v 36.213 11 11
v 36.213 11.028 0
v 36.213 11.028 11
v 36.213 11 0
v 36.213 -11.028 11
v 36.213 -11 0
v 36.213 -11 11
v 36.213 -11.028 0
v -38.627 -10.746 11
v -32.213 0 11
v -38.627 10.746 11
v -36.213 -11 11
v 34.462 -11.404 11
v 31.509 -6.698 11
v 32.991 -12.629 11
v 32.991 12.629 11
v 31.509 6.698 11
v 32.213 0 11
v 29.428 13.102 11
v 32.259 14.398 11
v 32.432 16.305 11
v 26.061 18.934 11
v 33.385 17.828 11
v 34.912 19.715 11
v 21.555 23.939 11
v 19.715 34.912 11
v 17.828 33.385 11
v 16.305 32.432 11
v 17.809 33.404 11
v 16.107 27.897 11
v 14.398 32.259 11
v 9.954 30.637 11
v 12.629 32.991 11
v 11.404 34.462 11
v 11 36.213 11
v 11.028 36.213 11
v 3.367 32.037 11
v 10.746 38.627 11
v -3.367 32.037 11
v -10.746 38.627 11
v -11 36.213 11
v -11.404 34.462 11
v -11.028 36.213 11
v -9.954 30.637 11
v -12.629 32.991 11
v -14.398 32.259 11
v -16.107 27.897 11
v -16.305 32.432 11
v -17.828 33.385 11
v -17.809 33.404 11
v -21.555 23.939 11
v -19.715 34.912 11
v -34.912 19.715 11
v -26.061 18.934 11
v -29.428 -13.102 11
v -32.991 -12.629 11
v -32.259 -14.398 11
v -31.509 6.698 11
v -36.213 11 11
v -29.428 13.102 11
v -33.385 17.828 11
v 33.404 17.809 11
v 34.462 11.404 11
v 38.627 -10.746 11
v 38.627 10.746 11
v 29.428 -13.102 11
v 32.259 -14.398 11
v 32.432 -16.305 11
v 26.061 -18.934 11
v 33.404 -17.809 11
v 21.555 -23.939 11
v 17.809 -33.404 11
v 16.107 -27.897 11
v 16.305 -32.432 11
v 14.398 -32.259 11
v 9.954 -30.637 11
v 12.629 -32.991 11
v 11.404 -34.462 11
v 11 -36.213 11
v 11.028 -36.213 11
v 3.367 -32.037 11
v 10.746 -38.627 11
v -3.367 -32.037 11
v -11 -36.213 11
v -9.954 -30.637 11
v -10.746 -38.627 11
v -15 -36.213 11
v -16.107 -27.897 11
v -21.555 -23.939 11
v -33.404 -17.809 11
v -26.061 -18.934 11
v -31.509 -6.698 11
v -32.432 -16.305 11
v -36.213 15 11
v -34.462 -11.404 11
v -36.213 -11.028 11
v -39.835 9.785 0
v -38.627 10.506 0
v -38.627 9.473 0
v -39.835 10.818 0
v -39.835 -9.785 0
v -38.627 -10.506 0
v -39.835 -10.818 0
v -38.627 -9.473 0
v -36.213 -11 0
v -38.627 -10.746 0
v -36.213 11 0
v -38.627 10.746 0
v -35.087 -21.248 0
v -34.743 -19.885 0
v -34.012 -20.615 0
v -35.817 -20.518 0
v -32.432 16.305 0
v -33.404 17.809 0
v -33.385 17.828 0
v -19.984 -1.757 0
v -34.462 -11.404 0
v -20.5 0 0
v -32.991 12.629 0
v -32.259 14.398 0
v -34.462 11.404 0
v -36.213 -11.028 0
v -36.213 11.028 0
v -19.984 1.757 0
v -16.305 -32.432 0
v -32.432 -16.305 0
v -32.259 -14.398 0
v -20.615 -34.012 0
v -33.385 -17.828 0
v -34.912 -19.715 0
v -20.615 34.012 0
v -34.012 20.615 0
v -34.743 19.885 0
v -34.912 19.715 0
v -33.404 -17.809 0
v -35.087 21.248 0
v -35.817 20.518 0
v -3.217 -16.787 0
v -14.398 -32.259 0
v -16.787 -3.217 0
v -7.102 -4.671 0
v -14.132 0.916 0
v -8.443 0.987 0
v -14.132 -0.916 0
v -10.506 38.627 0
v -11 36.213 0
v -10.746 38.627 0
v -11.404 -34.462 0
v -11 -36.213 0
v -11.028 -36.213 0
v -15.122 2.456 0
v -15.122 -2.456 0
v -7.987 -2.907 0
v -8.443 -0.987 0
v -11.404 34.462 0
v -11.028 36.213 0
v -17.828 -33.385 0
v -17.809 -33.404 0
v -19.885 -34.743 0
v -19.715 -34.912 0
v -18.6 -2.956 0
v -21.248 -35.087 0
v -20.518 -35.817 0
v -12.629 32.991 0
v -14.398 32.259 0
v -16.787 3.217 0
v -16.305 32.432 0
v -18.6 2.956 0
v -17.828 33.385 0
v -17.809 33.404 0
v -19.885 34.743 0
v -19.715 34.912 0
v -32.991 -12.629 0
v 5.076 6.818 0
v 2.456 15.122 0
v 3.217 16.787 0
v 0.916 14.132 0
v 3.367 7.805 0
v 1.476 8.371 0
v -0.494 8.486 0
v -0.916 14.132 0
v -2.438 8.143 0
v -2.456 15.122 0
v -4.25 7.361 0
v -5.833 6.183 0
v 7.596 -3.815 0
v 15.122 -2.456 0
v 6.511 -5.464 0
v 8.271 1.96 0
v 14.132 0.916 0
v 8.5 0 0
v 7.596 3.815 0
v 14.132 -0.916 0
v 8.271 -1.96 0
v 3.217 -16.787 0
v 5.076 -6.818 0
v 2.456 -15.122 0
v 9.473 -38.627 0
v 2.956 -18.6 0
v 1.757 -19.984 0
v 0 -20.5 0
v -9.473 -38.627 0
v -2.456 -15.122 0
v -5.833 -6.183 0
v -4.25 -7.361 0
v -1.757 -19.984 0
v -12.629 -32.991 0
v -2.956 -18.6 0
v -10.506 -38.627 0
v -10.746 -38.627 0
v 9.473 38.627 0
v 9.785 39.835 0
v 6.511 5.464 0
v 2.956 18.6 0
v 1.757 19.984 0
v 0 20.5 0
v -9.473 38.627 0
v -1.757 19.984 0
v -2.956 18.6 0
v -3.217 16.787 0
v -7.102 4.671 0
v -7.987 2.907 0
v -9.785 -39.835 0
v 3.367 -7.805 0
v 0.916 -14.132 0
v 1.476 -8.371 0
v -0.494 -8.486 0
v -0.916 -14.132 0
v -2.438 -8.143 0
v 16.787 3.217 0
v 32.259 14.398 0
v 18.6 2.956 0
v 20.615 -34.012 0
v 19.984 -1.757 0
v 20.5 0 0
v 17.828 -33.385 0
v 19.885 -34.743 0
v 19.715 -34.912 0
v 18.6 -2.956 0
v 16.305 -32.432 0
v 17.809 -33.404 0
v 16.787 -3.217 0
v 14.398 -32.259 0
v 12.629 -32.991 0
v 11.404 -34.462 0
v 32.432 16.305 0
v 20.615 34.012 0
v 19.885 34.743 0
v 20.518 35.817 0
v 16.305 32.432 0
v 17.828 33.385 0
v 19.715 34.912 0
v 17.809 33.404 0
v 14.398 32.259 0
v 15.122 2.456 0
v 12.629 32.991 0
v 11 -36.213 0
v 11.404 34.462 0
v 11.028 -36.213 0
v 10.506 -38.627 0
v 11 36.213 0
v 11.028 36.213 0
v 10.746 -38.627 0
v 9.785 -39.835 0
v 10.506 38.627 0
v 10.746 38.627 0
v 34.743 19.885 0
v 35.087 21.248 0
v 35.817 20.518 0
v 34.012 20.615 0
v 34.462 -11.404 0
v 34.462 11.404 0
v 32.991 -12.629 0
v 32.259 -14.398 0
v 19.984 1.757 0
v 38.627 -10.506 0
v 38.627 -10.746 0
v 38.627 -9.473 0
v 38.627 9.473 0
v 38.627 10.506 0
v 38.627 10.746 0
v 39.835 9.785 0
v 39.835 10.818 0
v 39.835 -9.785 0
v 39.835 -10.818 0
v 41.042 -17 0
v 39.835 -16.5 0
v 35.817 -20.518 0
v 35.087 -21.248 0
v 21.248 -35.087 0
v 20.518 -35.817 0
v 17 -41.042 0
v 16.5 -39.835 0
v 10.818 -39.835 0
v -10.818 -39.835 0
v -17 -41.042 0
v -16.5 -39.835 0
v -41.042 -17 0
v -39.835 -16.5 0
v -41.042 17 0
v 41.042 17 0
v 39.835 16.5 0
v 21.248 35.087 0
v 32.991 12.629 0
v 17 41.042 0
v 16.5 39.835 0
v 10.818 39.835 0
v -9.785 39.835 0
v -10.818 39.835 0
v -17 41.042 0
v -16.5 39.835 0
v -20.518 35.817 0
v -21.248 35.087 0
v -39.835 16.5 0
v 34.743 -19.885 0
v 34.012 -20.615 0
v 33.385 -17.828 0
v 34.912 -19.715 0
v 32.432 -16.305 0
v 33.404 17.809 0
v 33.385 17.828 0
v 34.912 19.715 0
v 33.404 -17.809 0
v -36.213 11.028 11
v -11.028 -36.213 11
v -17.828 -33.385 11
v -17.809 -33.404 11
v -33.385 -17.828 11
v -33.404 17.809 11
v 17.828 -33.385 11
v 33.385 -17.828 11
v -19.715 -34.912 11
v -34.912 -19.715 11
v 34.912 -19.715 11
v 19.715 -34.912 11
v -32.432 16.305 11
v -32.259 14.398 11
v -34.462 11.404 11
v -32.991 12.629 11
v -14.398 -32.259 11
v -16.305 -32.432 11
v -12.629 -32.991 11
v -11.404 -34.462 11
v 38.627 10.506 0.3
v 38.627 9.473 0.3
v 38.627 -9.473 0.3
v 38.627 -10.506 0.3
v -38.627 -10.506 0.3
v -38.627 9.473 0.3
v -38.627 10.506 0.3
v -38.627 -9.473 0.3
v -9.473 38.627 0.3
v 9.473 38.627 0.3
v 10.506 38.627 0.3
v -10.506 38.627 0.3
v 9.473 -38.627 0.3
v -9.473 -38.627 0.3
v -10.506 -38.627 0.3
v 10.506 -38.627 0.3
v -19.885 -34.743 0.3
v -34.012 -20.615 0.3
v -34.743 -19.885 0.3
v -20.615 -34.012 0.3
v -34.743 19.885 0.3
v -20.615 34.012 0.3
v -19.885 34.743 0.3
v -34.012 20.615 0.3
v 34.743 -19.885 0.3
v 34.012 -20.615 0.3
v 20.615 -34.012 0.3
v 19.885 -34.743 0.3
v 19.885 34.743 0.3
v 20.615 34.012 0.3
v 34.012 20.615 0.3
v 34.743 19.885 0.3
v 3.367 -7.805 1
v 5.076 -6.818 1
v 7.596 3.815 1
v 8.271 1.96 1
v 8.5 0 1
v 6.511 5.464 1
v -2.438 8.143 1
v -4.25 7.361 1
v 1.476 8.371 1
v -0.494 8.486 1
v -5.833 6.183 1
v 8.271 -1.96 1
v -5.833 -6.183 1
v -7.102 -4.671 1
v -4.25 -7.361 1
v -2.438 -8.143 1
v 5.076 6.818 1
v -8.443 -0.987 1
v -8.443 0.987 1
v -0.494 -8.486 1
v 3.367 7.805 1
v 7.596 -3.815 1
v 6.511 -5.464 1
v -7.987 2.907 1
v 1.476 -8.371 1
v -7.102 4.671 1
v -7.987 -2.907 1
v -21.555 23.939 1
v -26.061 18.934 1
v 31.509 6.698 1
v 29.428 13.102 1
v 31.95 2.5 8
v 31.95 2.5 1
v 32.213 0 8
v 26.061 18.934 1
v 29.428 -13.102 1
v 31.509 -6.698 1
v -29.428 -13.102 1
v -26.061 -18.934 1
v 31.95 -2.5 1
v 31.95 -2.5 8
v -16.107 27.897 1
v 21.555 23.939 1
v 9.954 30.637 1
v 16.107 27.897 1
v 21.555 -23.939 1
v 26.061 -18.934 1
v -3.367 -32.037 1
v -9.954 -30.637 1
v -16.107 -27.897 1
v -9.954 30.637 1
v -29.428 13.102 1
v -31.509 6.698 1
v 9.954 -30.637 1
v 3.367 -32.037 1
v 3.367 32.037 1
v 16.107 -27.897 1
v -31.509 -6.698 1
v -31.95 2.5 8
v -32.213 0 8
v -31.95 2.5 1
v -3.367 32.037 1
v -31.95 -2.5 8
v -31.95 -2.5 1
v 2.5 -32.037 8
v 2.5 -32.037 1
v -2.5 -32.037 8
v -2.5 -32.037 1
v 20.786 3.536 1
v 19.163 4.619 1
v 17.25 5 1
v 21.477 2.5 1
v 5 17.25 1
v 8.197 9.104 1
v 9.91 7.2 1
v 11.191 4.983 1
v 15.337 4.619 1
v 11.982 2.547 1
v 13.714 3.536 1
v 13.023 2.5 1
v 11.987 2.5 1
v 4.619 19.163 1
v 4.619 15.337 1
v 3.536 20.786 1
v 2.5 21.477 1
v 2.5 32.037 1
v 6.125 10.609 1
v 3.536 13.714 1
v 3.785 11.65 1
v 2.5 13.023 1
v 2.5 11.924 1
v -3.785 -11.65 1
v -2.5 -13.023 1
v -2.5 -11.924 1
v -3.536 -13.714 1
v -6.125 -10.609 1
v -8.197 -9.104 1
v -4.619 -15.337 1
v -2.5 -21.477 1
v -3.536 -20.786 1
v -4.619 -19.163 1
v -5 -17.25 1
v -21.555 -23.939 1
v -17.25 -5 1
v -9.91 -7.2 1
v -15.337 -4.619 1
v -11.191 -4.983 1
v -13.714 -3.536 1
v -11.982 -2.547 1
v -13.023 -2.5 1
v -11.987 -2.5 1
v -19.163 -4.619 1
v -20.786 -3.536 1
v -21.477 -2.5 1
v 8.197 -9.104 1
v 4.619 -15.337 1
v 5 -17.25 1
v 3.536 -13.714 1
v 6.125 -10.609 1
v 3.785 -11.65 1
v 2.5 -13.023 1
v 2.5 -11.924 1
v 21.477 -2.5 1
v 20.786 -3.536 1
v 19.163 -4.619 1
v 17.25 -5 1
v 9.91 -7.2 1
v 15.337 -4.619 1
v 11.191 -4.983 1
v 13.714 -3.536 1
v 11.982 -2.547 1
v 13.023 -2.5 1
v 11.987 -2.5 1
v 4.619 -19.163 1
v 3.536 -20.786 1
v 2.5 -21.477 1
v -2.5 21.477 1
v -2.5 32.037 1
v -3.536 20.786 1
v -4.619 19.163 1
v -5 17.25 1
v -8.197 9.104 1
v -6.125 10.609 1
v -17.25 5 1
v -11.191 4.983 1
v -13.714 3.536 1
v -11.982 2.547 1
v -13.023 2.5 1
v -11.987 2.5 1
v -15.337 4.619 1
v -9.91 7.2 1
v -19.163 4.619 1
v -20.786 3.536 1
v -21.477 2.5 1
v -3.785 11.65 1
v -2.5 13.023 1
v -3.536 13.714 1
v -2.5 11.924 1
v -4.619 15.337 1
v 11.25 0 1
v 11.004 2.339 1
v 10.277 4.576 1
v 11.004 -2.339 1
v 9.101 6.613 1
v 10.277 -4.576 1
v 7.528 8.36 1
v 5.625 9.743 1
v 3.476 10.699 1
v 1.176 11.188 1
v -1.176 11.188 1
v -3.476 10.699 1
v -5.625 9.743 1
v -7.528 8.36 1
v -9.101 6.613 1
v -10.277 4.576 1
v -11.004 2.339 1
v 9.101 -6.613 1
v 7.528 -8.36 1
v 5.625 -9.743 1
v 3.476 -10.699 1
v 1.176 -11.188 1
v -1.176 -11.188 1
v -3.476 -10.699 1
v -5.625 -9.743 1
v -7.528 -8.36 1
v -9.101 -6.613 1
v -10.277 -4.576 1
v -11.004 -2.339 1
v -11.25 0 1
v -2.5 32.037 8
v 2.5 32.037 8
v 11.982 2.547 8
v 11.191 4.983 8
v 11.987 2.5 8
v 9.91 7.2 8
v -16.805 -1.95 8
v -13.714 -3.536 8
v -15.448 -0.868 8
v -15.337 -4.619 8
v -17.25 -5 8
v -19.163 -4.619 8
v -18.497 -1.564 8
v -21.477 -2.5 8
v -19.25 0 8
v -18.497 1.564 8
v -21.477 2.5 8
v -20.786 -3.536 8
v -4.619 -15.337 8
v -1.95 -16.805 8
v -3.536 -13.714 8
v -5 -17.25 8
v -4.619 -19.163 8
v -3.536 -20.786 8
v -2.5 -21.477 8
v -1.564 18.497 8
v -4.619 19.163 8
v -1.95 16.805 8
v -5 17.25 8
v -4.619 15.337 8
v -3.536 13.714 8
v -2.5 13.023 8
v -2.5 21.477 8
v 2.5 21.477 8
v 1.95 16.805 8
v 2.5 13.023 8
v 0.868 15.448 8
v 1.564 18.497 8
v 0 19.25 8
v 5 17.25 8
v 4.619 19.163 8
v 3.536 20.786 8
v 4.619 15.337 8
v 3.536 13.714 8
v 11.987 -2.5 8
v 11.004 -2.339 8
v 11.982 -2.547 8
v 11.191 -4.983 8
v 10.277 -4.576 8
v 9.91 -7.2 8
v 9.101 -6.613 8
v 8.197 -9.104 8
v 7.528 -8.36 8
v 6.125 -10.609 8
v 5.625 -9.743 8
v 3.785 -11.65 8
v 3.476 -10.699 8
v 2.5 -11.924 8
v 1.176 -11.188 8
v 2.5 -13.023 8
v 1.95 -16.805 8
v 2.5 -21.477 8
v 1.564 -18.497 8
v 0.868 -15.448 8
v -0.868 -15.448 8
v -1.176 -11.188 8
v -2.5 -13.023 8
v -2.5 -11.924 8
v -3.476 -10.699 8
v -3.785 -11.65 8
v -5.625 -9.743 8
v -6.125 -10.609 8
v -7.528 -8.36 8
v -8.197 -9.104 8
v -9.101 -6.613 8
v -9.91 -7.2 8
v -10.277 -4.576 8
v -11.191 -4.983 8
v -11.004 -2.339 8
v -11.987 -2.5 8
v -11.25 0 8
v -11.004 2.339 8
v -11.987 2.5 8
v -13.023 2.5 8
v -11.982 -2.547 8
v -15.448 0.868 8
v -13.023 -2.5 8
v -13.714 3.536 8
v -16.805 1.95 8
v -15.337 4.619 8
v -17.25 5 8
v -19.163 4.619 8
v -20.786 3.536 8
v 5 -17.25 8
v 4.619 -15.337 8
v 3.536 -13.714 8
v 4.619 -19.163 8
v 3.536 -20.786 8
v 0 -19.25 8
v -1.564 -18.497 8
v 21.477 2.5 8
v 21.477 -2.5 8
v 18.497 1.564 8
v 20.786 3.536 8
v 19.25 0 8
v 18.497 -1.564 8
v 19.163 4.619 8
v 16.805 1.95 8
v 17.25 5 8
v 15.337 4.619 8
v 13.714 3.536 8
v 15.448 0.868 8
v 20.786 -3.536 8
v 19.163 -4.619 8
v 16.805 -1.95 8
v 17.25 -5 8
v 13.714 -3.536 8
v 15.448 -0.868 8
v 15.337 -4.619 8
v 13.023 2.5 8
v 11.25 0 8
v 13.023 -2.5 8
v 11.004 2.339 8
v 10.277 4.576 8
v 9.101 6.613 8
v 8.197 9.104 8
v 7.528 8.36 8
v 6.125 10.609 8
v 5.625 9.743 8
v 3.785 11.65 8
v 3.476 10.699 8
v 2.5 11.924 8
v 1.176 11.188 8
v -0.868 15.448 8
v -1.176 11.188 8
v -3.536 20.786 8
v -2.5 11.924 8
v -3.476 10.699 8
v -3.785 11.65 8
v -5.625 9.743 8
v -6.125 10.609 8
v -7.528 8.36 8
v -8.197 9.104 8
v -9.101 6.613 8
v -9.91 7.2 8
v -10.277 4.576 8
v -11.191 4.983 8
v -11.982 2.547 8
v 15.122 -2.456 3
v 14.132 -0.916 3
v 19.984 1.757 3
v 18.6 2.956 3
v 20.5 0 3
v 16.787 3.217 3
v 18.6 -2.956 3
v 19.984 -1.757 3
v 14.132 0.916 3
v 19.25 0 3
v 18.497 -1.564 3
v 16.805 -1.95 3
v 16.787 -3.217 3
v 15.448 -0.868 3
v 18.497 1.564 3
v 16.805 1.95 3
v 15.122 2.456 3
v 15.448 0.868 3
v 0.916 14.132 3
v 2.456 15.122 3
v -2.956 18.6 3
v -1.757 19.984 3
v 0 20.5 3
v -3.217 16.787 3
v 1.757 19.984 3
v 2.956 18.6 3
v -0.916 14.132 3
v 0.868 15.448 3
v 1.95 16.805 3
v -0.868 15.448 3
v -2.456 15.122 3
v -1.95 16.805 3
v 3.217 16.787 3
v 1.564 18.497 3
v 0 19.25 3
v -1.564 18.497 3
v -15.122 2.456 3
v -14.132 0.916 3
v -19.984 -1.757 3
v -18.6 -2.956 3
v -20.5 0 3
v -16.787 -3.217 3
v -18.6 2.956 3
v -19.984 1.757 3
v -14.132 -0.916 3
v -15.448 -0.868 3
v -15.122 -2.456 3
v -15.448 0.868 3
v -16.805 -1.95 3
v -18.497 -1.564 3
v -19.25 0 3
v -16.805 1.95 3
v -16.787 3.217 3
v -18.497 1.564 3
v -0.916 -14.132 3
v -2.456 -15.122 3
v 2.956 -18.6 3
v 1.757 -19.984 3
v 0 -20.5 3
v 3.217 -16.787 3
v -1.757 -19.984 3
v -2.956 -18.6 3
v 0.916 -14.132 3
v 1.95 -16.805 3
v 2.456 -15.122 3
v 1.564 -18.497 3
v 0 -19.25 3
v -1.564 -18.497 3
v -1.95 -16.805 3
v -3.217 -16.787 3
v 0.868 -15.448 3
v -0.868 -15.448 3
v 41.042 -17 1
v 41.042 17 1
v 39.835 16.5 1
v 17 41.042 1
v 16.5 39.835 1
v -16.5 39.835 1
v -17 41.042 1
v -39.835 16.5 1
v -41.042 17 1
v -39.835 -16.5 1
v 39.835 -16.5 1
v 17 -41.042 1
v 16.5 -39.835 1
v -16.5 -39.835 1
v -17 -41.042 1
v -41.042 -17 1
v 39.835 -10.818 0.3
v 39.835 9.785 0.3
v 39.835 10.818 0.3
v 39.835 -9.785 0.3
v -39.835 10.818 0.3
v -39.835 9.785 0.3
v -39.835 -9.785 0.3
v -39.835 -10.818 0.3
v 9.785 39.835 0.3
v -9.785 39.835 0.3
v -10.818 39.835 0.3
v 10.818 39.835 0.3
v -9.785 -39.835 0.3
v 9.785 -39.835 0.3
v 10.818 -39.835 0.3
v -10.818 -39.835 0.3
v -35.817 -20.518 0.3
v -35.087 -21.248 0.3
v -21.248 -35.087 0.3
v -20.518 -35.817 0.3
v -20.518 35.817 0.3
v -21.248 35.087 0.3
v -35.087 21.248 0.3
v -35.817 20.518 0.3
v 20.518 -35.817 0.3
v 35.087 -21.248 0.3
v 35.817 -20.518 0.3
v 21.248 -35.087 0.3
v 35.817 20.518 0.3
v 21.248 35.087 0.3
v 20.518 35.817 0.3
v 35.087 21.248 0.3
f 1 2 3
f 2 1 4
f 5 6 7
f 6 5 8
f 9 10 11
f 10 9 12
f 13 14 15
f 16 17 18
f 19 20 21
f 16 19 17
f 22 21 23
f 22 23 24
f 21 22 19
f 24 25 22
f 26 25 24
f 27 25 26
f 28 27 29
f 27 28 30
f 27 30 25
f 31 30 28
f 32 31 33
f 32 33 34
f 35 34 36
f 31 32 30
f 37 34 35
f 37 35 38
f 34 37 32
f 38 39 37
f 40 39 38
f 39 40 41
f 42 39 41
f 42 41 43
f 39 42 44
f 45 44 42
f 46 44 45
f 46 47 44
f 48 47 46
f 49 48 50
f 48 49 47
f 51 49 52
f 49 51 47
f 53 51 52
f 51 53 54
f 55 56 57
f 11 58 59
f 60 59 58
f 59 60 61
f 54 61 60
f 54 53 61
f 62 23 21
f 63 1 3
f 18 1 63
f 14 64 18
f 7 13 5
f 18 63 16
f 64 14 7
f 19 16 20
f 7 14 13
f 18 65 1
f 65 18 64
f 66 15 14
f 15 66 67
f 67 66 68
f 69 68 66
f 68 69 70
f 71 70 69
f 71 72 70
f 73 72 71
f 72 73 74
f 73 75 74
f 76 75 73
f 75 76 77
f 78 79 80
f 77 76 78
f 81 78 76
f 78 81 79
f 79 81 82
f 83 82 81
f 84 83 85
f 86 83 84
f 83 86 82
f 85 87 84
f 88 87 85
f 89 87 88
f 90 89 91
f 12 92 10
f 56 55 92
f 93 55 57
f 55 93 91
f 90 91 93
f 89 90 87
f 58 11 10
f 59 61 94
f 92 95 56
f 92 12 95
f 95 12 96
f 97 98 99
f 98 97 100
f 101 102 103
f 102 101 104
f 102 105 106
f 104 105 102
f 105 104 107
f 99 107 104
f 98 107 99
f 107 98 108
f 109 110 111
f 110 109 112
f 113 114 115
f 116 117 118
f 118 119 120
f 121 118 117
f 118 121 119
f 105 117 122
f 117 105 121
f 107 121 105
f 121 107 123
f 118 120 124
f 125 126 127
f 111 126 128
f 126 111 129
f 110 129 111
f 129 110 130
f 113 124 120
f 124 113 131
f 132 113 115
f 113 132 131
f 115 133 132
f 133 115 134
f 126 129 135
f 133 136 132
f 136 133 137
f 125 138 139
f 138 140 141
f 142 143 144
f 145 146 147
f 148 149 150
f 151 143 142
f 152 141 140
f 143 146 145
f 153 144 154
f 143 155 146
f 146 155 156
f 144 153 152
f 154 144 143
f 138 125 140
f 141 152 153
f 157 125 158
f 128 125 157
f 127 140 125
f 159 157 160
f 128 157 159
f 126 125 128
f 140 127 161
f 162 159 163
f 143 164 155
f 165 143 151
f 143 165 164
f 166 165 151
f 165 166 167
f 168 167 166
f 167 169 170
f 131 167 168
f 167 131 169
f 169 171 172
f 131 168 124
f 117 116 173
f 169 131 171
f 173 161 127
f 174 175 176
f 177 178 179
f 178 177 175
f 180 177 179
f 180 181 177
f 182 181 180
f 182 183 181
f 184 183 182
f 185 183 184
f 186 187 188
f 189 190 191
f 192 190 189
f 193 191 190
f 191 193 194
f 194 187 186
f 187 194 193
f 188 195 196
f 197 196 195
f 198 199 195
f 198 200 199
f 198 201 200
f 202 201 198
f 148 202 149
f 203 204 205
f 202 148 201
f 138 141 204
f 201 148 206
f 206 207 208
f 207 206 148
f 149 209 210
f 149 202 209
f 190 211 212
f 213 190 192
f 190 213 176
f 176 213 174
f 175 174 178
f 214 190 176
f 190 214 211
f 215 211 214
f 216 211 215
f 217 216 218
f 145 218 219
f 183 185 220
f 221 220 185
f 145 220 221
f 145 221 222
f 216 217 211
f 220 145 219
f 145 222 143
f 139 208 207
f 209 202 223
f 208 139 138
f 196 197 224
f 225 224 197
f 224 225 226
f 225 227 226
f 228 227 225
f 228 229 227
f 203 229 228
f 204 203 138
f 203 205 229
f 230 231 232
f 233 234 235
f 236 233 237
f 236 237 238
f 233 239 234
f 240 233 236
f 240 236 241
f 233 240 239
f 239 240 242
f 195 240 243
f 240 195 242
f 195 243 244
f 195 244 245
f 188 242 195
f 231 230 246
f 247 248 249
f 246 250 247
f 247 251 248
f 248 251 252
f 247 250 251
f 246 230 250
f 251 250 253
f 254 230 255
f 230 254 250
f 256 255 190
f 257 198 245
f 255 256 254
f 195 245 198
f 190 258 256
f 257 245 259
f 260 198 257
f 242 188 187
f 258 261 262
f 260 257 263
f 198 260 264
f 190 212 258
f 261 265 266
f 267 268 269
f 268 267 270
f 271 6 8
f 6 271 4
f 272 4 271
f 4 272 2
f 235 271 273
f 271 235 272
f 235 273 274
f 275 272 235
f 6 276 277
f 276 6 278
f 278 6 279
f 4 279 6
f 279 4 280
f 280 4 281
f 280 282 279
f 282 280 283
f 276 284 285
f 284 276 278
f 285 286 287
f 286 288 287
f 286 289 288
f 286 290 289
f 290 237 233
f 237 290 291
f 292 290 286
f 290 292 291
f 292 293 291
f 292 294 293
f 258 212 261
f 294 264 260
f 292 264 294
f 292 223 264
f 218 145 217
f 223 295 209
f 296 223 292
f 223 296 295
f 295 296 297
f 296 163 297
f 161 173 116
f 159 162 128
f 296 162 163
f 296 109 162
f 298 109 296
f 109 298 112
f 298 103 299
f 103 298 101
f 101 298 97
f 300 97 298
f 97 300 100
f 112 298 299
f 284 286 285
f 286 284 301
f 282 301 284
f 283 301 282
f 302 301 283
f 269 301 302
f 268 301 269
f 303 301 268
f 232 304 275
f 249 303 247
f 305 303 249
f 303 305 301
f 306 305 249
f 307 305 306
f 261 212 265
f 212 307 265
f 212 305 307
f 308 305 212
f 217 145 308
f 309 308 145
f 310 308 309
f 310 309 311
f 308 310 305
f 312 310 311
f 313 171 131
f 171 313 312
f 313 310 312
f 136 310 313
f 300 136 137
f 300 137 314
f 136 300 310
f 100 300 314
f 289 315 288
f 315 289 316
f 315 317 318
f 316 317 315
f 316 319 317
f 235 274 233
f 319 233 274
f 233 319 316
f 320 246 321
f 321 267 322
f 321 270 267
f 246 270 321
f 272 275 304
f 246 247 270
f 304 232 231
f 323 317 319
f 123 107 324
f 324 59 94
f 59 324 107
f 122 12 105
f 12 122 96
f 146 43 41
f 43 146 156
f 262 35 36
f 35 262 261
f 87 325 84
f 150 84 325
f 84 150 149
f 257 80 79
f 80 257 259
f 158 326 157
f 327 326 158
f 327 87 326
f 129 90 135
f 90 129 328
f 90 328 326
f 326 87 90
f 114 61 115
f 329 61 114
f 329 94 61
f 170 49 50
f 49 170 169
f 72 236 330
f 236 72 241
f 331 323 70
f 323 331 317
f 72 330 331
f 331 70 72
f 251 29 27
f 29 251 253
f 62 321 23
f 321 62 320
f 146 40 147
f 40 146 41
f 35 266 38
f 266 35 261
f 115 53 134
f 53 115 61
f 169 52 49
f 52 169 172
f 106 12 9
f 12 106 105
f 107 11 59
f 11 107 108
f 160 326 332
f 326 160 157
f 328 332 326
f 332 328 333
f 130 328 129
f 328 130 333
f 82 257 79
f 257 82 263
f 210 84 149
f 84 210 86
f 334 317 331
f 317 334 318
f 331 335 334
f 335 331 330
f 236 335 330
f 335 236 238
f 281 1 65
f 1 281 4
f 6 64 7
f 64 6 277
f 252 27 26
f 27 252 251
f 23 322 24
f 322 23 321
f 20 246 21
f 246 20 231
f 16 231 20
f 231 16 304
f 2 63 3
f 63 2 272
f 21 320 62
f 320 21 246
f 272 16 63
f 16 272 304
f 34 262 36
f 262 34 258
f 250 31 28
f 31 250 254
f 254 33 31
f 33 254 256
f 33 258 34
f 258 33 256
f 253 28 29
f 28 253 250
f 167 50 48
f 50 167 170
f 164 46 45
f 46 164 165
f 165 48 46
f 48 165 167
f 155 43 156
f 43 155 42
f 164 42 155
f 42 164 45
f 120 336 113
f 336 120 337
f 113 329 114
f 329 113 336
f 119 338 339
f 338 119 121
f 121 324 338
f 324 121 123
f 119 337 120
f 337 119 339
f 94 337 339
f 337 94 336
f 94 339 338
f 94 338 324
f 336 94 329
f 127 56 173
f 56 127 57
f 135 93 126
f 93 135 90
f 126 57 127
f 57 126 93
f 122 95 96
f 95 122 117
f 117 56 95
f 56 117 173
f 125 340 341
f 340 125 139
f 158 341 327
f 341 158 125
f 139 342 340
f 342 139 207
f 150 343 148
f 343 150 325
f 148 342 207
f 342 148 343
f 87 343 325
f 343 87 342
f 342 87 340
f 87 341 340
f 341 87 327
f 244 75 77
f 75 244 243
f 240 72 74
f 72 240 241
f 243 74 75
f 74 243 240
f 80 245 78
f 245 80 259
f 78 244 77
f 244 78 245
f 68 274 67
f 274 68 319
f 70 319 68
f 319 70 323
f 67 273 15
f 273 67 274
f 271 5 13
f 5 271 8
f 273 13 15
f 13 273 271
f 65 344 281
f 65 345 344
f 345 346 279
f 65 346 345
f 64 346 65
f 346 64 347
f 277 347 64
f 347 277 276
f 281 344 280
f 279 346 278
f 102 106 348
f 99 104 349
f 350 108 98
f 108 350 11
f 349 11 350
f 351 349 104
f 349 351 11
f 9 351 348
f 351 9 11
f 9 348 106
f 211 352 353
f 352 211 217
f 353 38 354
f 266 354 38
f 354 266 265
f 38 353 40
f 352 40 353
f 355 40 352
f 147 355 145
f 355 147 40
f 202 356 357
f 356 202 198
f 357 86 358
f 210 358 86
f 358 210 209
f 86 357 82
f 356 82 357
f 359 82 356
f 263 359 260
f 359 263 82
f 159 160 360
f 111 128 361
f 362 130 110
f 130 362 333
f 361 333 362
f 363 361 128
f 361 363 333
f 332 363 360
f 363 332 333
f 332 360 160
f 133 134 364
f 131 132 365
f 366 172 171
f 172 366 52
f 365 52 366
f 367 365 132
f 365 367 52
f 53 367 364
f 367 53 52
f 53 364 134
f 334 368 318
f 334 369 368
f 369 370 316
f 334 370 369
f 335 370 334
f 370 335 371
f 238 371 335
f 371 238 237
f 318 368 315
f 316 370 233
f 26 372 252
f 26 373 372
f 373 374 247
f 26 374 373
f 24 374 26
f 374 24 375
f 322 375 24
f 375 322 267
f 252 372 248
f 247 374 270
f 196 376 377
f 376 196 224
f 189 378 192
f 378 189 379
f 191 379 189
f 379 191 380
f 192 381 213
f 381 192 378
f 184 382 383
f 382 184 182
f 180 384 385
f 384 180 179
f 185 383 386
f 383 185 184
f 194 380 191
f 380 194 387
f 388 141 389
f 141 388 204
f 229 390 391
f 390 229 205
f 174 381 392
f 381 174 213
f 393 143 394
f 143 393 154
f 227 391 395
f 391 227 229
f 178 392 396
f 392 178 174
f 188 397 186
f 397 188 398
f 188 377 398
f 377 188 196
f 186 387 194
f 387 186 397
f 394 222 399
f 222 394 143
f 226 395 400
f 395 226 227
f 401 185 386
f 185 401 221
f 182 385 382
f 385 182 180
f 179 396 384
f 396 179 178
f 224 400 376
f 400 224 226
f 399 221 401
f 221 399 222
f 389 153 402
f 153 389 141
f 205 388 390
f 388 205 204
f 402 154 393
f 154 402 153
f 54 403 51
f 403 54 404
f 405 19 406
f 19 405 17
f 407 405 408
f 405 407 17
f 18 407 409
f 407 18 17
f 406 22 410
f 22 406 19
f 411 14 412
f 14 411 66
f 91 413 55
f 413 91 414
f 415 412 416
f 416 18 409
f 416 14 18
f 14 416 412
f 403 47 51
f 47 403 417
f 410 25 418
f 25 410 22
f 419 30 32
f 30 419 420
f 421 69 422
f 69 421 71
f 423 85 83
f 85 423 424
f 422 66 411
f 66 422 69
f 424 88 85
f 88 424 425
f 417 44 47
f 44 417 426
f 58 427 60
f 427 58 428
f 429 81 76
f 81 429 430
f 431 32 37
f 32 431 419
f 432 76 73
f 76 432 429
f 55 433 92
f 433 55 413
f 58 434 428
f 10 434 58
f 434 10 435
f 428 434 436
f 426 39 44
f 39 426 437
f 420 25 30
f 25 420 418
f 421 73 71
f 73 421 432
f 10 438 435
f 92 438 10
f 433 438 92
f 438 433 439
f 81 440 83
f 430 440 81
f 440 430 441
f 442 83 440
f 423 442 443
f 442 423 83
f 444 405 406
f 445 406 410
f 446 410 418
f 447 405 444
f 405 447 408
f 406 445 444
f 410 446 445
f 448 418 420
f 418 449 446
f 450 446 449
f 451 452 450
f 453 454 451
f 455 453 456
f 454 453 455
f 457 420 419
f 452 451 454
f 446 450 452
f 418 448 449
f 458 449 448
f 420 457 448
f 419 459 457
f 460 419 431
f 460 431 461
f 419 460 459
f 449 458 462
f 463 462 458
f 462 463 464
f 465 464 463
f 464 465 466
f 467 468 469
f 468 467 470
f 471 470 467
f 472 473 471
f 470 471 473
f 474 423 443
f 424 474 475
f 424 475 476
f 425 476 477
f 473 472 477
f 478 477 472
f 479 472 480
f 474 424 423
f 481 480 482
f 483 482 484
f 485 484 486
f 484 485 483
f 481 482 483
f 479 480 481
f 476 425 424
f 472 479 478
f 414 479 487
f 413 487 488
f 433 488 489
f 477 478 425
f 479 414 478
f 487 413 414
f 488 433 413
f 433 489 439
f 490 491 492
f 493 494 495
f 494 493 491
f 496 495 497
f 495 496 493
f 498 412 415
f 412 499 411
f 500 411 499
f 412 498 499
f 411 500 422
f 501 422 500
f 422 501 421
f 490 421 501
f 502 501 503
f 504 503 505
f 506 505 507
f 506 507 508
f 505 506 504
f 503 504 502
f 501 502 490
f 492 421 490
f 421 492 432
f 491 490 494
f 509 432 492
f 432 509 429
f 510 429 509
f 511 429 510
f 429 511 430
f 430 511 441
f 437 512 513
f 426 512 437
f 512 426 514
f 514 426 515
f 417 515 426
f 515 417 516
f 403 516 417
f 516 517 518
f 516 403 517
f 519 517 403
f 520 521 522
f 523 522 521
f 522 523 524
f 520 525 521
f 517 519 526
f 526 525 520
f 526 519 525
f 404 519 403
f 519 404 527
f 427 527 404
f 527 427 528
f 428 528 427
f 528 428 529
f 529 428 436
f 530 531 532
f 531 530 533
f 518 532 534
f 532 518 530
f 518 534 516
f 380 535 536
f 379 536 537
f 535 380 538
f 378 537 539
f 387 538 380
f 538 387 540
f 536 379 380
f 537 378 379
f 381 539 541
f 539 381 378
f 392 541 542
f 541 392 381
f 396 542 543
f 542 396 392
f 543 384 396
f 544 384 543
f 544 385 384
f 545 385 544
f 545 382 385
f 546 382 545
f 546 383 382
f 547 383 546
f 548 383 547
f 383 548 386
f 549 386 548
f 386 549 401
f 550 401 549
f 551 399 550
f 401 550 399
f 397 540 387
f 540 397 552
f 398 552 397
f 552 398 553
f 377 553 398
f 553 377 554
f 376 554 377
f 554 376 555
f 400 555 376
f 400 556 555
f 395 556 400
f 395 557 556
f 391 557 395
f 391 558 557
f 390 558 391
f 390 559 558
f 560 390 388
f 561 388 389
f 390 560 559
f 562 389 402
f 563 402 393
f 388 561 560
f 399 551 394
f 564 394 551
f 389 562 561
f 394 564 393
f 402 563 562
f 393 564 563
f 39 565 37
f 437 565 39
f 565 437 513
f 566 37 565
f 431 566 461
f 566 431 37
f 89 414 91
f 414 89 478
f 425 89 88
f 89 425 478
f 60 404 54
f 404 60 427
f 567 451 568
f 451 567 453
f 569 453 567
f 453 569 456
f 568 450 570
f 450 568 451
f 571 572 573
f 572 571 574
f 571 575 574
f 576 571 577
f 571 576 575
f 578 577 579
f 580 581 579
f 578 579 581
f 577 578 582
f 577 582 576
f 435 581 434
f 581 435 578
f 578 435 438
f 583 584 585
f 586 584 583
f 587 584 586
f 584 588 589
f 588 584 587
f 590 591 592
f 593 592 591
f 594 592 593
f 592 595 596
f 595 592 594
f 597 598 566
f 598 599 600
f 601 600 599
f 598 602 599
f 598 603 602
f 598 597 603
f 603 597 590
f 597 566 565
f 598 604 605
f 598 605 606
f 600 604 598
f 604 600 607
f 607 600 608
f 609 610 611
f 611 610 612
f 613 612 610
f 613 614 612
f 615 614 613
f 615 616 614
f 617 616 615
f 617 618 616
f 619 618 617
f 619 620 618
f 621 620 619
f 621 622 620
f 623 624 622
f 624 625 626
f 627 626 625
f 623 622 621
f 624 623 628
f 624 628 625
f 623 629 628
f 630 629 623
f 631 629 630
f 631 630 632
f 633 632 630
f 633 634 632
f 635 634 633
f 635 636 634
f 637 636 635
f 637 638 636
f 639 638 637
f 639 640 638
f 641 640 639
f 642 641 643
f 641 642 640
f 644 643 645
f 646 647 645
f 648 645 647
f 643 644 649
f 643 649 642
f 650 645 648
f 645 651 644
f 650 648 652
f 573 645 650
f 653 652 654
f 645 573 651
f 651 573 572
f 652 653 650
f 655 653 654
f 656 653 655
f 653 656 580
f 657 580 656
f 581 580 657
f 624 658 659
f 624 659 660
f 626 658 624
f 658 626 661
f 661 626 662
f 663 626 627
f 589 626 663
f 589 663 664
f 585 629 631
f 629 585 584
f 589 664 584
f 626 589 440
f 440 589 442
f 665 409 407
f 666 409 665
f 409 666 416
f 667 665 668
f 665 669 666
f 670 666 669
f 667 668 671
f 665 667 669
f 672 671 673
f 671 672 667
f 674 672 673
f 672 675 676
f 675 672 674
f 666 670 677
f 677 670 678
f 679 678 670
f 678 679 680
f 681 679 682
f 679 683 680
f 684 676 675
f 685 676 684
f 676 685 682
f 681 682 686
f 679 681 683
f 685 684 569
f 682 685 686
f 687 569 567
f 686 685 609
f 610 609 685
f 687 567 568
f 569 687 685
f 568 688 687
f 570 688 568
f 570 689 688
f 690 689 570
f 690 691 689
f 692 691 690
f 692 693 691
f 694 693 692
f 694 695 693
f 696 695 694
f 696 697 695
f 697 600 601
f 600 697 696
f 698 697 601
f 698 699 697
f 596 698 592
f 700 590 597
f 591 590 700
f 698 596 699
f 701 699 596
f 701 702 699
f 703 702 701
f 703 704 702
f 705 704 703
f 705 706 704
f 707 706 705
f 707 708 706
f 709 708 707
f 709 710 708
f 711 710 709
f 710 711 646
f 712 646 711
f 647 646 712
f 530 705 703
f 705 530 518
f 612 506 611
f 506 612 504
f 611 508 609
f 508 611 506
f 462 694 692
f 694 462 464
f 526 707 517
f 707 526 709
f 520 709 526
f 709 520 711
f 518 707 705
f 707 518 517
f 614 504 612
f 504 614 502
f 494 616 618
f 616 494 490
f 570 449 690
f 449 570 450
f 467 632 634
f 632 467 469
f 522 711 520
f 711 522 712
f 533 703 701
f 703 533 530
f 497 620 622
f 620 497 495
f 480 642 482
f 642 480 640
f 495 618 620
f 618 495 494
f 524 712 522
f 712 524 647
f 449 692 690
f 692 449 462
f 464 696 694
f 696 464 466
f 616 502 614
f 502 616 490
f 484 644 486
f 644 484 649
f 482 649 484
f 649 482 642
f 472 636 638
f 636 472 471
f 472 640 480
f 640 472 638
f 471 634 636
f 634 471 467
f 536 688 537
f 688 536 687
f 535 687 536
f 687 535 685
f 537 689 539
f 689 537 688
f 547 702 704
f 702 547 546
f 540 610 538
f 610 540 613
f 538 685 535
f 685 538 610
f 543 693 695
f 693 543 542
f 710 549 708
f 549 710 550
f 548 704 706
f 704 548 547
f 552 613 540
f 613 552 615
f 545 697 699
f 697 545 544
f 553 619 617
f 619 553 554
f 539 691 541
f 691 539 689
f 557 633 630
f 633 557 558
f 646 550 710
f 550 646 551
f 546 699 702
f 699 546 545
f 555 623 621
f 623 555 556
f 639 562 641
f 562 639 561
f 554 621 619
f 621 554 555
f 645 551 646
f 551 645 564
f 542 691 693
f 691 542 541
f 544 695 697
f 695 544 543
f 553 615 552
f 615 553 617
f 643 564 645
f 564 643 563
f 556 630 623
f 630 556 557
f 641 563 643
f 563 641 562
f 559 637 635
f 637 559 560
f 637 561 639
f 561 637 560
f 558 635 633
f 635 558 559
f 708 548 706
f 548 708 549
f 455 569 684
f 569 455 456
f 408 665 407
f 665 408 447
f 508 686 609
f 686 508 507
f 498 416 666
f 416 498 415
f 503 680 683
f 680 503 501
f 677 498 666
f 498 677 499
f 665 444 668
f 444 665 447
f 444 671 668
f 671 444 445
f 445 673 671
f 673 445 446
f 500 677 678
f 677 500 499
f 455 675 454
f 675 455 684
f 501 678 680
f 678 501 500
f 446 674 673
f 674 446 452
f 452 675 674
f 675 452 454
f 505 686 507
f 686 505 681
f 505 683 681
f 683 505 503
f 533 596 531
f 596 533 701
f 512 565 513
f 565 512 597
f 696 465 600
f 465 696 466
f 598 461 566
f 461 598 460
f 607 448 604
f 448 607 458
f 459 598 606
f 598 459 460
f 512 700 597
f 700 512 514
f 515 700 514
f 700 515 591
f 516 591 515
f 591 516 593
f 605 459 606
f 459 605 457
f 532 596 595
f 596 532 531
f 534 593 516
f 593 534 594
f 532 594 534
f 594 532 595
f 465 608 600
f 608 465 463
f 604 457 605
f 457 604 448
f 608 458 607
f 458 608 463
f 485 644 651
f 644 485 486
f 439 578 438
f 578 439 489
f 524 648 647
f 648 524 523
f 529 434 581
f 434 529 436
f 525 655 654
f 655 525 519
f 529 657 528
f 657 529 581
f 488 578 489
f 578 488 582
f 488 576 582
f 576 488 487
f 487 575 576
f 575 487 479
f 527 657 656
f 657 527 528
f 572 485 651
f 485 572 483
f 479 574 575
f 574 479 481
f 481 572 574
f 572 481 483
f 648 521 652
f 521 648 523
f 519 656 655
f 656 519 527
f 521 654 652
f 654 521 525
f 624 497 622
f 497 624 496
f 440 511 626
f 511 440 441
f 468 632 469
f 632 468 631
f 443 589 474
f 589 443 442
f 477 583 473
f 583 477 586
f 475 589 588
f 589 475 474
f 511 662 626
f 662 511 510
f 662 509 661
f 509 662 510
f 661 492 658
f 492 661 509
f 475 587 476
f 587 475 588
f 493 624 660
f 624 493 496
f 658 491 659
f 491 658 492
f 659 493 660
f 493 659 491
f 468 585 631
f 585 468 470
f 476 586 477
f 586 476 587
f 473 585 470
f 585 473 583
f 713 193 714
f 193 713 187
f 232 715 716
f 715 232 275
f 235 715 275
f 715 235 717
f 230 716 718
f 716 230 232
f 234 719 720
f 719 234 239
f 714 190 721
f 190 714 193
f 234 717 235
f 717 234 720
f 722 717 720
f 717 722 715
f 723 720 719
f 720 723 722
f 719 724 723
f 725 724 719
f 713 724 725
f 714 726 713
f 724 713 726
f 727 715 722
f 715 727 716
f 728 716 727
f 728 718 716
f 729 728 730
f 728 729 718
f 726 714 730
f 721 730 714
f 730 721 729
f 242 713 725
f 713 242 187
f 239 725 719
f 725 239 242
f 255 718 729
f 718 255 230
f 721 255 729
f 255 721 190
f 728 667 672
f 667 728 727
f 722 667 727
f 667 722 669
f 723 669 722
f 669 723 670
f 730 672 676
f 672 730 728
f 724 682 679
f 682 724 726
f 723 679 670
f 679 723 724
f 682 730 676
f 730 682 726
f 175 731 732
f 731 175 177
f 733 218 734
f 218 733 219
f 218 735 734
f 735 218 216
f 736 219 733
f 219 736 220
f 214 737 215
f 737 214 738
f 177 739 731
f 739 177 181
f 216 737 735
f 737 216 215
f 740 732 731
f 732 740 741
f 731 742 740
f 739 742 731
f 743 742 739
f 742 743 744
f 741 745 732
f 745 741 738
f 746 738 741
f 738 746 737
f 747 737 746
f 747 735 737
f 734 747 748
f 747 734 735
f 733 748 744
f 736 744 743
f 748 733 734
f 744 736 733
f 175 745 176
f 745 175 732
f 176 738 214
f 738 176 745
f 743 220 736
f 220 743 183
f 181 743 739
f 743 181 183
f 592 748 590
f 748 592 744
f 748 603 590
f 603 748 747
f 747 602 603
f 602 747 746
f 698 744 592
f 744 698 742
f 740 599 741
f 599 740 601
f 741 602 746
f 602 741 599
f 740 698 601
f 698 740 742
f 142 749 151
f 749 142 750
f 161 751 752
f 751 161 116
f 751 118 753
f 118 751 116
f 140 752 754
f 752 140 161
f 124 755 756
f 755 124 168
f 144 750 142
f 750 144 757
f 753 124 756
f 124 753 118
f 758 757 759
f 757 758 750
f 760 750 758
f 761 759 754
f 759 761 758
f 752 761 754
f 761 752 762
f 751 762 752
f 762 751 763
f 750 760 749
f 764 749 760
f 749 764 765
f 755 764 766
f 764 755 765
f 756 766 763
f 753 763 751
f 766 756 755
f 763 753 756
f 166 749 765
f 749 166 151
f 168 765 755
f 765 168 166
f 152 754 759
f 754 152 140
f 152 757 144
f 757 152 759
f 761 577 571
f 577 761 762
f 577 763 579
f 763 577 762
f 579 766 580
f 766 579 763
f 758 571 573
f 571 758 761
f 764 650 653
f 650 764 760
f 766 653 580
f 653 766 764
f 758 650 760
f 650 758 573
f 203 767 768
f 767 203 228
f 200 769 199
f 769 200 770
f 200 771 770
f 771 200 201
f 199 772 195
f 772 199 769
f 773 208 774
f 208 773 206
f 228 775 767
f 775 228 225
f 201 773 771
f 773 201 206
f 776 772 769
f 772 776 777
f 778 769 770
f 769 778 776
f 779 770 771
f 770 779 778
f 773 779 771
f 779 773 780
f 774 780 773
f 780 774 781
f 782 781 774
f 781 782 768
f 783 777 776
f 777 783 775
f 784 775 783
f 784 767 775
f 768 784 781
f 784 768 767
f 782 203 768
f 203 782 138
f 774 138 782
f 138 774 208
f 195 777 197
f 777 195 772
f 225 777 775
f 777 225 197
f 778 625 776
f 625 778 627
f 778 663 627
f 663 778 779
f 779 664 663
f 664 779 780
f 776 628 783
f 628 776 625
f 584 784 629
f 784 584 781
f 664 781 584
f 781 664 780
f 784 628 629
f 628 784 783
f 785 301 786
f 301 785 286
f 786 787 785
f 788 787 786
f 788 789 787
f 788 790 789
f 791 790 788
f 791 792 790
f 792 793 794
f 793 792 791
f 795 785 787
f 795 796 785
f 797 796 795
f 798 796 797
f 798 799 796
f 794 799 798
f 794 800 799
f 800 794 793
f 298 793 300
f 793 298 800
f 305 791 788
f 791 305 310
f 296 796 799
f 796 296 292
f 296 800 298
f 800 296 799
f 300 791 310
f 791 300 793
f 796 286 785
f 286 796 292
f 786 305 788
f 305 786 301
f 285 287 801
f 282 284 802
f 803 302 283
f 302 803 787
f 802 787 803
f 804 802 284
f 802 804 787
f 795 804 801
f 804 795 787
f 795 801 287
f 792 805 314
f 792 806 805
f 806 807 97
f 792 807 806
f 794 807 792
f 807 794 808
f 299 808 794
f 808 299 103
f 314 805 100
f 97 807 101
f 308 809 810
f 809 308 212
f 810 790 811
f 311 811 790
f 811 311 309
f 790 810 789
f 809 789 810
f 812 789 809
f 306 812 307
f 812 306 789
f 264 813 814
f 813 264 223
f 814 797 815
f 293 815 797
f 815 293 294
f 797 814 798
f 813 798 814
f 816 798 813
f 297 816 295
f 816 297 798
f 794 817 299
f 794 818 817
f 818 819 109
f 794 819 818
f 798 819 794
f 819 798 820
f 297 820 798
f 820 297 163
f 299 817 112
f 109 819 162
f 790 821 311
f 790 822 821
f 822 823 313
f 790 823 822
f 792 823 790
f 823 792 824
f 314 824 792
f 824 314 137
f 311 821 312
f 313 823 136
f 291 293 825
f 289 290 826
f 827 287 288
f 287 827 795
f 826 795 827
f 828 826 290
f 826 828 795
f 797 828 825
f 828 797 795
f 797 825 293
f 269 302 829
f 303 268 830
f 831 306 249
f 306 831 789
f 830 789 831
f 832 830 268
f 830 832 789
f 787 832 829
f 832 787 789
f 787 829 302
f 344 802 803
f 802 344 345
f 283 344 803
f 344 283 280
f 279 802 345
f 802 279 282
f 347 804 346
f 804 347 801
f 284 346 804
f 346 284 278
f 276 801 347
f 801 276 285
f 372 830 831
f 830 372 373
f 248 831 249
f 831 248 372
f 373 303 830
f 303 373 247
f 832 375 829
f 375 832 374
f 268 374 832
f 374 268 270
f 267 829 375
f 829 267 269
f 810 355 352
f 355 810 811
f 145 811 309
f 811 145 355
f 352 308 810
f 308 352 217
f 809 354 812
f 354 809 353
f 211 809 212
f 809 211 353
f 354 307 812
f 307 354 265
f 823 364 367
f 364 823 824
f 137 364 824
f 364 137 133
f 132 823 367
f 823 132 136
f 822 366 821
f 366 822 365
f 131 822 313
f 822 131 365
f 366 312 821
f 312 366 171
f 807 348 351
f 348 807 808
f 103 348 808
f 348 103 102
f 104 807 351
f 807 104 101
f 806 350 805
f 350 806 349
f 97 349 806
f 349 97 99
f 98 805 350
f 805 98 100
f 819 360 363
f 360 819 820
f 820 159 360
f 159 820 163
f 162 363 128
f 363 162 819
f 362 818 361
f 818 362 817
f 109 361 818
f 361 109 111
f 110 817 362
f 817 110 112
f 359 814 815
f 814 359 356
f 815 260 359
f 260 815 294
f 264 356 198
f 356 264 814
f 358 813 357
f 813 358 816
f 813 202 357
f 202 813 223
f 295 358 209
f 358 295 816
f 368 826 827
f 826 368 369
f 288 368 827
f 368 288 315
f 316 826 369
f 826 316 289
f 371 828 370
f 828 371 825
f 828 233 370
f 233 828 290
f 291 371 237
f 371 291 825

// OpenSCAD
module octagon(side=30, height=12){
 	width = side+(2*sqrt((side*side)/2));
	translate([0,0,height/2]) intersection(){
		cube([width, width, height],center=true);
		rotate(45,[0,0,1])cube([width, width, height],center=true);
	}
}

module gear(face=30, cutout=8, height=11) {
	width = face+(2*sqrt((face*face)/2));
	cutout_r = cutout/2;
	vertex_r = sqrt(((face/2)*(face/2))+((width/2)*(width/2)));
	difference() {
		union() {
			difference(){
				union() {
					octagon(face,height);
					for(angle=[0:45:315]){
						rotate(angle,[0,0,1]) translate([0,width/2,0])toothcurve(edge=face, height=height, cutout=cutout);
					}
				}
				union() {
					cylinder(r=8.5,h=height);
					for(angle=[0:45:315]) {
						rotate(angle,[0,0,1]) rotate(22.5,[0,0,1]) translate([vertex_r,0,0])cylinder(r=cutout_r,h=height);
					}
					difference(){
						octagon(face+25,height);
						octagon(face+2,height);
					}
					translate([0,0,1])cylinder(r=(width/2)-((cutout/2)),h=height);
				}
			}
			difference(){
				cylinder(r=24.5/2,h=8);
				cylinder(r=22.5/2,h=8);
			}
			for(nutangle=[0:90:360]) {
				rotate(nutangle,[0,0,1]) {
					translate([22.5/2,-2.5,0]) cube([(width/2)-((cutout/2))-(22.5/2),5,8]);
					translate([24.5/2+5,0,0]) cylinder(r=5,h=8);
				}
			}
		}	
		for(nutangle=[0:90:360]) {
				rotate(nutangle,[0,0,1]) translate([24.5/2+5,0,0]) {
					cylinder(r=3.25,h=3);
					cylinder(r=2,h=8.5);
				}
		}
	}
}

module surround(inner=30) {
	difference(){
		octagon(inner+4,1);
		octagon(inner+3,1);
	}
	for(rotation=[0:45:360]){
		rotate(rotation+14.5,[0,0,1]) translate([(inner/2)+(inner*0.4),-0.5,0]) cube([inner/2,1,0.3]);
		rotate(rotation-14.5,[0,0,1]) translate([(inner/2)+(inner*0.4),-0.5,0]) cube([inner/2,1,0.3]);
	}
}

module toothcurve(edge=30,height=5,cutout=8,wiggle=1) {
	intersection() {
		translate([edge/2,0,0])cylinder(r=edge-(cutout/2),h=height);
		translate([-edge/2,0,0])cylinder(r=edge-(cutout/2),h=height);
	}
}

module singlegear(){
	gear();
	surround();
}

//translate([0,40.5,0]) singlegear();
//translate([0,-40.5,0]) singlegear();

singlegear();

//translate([5,0,0]) cube([34,1,4]);
